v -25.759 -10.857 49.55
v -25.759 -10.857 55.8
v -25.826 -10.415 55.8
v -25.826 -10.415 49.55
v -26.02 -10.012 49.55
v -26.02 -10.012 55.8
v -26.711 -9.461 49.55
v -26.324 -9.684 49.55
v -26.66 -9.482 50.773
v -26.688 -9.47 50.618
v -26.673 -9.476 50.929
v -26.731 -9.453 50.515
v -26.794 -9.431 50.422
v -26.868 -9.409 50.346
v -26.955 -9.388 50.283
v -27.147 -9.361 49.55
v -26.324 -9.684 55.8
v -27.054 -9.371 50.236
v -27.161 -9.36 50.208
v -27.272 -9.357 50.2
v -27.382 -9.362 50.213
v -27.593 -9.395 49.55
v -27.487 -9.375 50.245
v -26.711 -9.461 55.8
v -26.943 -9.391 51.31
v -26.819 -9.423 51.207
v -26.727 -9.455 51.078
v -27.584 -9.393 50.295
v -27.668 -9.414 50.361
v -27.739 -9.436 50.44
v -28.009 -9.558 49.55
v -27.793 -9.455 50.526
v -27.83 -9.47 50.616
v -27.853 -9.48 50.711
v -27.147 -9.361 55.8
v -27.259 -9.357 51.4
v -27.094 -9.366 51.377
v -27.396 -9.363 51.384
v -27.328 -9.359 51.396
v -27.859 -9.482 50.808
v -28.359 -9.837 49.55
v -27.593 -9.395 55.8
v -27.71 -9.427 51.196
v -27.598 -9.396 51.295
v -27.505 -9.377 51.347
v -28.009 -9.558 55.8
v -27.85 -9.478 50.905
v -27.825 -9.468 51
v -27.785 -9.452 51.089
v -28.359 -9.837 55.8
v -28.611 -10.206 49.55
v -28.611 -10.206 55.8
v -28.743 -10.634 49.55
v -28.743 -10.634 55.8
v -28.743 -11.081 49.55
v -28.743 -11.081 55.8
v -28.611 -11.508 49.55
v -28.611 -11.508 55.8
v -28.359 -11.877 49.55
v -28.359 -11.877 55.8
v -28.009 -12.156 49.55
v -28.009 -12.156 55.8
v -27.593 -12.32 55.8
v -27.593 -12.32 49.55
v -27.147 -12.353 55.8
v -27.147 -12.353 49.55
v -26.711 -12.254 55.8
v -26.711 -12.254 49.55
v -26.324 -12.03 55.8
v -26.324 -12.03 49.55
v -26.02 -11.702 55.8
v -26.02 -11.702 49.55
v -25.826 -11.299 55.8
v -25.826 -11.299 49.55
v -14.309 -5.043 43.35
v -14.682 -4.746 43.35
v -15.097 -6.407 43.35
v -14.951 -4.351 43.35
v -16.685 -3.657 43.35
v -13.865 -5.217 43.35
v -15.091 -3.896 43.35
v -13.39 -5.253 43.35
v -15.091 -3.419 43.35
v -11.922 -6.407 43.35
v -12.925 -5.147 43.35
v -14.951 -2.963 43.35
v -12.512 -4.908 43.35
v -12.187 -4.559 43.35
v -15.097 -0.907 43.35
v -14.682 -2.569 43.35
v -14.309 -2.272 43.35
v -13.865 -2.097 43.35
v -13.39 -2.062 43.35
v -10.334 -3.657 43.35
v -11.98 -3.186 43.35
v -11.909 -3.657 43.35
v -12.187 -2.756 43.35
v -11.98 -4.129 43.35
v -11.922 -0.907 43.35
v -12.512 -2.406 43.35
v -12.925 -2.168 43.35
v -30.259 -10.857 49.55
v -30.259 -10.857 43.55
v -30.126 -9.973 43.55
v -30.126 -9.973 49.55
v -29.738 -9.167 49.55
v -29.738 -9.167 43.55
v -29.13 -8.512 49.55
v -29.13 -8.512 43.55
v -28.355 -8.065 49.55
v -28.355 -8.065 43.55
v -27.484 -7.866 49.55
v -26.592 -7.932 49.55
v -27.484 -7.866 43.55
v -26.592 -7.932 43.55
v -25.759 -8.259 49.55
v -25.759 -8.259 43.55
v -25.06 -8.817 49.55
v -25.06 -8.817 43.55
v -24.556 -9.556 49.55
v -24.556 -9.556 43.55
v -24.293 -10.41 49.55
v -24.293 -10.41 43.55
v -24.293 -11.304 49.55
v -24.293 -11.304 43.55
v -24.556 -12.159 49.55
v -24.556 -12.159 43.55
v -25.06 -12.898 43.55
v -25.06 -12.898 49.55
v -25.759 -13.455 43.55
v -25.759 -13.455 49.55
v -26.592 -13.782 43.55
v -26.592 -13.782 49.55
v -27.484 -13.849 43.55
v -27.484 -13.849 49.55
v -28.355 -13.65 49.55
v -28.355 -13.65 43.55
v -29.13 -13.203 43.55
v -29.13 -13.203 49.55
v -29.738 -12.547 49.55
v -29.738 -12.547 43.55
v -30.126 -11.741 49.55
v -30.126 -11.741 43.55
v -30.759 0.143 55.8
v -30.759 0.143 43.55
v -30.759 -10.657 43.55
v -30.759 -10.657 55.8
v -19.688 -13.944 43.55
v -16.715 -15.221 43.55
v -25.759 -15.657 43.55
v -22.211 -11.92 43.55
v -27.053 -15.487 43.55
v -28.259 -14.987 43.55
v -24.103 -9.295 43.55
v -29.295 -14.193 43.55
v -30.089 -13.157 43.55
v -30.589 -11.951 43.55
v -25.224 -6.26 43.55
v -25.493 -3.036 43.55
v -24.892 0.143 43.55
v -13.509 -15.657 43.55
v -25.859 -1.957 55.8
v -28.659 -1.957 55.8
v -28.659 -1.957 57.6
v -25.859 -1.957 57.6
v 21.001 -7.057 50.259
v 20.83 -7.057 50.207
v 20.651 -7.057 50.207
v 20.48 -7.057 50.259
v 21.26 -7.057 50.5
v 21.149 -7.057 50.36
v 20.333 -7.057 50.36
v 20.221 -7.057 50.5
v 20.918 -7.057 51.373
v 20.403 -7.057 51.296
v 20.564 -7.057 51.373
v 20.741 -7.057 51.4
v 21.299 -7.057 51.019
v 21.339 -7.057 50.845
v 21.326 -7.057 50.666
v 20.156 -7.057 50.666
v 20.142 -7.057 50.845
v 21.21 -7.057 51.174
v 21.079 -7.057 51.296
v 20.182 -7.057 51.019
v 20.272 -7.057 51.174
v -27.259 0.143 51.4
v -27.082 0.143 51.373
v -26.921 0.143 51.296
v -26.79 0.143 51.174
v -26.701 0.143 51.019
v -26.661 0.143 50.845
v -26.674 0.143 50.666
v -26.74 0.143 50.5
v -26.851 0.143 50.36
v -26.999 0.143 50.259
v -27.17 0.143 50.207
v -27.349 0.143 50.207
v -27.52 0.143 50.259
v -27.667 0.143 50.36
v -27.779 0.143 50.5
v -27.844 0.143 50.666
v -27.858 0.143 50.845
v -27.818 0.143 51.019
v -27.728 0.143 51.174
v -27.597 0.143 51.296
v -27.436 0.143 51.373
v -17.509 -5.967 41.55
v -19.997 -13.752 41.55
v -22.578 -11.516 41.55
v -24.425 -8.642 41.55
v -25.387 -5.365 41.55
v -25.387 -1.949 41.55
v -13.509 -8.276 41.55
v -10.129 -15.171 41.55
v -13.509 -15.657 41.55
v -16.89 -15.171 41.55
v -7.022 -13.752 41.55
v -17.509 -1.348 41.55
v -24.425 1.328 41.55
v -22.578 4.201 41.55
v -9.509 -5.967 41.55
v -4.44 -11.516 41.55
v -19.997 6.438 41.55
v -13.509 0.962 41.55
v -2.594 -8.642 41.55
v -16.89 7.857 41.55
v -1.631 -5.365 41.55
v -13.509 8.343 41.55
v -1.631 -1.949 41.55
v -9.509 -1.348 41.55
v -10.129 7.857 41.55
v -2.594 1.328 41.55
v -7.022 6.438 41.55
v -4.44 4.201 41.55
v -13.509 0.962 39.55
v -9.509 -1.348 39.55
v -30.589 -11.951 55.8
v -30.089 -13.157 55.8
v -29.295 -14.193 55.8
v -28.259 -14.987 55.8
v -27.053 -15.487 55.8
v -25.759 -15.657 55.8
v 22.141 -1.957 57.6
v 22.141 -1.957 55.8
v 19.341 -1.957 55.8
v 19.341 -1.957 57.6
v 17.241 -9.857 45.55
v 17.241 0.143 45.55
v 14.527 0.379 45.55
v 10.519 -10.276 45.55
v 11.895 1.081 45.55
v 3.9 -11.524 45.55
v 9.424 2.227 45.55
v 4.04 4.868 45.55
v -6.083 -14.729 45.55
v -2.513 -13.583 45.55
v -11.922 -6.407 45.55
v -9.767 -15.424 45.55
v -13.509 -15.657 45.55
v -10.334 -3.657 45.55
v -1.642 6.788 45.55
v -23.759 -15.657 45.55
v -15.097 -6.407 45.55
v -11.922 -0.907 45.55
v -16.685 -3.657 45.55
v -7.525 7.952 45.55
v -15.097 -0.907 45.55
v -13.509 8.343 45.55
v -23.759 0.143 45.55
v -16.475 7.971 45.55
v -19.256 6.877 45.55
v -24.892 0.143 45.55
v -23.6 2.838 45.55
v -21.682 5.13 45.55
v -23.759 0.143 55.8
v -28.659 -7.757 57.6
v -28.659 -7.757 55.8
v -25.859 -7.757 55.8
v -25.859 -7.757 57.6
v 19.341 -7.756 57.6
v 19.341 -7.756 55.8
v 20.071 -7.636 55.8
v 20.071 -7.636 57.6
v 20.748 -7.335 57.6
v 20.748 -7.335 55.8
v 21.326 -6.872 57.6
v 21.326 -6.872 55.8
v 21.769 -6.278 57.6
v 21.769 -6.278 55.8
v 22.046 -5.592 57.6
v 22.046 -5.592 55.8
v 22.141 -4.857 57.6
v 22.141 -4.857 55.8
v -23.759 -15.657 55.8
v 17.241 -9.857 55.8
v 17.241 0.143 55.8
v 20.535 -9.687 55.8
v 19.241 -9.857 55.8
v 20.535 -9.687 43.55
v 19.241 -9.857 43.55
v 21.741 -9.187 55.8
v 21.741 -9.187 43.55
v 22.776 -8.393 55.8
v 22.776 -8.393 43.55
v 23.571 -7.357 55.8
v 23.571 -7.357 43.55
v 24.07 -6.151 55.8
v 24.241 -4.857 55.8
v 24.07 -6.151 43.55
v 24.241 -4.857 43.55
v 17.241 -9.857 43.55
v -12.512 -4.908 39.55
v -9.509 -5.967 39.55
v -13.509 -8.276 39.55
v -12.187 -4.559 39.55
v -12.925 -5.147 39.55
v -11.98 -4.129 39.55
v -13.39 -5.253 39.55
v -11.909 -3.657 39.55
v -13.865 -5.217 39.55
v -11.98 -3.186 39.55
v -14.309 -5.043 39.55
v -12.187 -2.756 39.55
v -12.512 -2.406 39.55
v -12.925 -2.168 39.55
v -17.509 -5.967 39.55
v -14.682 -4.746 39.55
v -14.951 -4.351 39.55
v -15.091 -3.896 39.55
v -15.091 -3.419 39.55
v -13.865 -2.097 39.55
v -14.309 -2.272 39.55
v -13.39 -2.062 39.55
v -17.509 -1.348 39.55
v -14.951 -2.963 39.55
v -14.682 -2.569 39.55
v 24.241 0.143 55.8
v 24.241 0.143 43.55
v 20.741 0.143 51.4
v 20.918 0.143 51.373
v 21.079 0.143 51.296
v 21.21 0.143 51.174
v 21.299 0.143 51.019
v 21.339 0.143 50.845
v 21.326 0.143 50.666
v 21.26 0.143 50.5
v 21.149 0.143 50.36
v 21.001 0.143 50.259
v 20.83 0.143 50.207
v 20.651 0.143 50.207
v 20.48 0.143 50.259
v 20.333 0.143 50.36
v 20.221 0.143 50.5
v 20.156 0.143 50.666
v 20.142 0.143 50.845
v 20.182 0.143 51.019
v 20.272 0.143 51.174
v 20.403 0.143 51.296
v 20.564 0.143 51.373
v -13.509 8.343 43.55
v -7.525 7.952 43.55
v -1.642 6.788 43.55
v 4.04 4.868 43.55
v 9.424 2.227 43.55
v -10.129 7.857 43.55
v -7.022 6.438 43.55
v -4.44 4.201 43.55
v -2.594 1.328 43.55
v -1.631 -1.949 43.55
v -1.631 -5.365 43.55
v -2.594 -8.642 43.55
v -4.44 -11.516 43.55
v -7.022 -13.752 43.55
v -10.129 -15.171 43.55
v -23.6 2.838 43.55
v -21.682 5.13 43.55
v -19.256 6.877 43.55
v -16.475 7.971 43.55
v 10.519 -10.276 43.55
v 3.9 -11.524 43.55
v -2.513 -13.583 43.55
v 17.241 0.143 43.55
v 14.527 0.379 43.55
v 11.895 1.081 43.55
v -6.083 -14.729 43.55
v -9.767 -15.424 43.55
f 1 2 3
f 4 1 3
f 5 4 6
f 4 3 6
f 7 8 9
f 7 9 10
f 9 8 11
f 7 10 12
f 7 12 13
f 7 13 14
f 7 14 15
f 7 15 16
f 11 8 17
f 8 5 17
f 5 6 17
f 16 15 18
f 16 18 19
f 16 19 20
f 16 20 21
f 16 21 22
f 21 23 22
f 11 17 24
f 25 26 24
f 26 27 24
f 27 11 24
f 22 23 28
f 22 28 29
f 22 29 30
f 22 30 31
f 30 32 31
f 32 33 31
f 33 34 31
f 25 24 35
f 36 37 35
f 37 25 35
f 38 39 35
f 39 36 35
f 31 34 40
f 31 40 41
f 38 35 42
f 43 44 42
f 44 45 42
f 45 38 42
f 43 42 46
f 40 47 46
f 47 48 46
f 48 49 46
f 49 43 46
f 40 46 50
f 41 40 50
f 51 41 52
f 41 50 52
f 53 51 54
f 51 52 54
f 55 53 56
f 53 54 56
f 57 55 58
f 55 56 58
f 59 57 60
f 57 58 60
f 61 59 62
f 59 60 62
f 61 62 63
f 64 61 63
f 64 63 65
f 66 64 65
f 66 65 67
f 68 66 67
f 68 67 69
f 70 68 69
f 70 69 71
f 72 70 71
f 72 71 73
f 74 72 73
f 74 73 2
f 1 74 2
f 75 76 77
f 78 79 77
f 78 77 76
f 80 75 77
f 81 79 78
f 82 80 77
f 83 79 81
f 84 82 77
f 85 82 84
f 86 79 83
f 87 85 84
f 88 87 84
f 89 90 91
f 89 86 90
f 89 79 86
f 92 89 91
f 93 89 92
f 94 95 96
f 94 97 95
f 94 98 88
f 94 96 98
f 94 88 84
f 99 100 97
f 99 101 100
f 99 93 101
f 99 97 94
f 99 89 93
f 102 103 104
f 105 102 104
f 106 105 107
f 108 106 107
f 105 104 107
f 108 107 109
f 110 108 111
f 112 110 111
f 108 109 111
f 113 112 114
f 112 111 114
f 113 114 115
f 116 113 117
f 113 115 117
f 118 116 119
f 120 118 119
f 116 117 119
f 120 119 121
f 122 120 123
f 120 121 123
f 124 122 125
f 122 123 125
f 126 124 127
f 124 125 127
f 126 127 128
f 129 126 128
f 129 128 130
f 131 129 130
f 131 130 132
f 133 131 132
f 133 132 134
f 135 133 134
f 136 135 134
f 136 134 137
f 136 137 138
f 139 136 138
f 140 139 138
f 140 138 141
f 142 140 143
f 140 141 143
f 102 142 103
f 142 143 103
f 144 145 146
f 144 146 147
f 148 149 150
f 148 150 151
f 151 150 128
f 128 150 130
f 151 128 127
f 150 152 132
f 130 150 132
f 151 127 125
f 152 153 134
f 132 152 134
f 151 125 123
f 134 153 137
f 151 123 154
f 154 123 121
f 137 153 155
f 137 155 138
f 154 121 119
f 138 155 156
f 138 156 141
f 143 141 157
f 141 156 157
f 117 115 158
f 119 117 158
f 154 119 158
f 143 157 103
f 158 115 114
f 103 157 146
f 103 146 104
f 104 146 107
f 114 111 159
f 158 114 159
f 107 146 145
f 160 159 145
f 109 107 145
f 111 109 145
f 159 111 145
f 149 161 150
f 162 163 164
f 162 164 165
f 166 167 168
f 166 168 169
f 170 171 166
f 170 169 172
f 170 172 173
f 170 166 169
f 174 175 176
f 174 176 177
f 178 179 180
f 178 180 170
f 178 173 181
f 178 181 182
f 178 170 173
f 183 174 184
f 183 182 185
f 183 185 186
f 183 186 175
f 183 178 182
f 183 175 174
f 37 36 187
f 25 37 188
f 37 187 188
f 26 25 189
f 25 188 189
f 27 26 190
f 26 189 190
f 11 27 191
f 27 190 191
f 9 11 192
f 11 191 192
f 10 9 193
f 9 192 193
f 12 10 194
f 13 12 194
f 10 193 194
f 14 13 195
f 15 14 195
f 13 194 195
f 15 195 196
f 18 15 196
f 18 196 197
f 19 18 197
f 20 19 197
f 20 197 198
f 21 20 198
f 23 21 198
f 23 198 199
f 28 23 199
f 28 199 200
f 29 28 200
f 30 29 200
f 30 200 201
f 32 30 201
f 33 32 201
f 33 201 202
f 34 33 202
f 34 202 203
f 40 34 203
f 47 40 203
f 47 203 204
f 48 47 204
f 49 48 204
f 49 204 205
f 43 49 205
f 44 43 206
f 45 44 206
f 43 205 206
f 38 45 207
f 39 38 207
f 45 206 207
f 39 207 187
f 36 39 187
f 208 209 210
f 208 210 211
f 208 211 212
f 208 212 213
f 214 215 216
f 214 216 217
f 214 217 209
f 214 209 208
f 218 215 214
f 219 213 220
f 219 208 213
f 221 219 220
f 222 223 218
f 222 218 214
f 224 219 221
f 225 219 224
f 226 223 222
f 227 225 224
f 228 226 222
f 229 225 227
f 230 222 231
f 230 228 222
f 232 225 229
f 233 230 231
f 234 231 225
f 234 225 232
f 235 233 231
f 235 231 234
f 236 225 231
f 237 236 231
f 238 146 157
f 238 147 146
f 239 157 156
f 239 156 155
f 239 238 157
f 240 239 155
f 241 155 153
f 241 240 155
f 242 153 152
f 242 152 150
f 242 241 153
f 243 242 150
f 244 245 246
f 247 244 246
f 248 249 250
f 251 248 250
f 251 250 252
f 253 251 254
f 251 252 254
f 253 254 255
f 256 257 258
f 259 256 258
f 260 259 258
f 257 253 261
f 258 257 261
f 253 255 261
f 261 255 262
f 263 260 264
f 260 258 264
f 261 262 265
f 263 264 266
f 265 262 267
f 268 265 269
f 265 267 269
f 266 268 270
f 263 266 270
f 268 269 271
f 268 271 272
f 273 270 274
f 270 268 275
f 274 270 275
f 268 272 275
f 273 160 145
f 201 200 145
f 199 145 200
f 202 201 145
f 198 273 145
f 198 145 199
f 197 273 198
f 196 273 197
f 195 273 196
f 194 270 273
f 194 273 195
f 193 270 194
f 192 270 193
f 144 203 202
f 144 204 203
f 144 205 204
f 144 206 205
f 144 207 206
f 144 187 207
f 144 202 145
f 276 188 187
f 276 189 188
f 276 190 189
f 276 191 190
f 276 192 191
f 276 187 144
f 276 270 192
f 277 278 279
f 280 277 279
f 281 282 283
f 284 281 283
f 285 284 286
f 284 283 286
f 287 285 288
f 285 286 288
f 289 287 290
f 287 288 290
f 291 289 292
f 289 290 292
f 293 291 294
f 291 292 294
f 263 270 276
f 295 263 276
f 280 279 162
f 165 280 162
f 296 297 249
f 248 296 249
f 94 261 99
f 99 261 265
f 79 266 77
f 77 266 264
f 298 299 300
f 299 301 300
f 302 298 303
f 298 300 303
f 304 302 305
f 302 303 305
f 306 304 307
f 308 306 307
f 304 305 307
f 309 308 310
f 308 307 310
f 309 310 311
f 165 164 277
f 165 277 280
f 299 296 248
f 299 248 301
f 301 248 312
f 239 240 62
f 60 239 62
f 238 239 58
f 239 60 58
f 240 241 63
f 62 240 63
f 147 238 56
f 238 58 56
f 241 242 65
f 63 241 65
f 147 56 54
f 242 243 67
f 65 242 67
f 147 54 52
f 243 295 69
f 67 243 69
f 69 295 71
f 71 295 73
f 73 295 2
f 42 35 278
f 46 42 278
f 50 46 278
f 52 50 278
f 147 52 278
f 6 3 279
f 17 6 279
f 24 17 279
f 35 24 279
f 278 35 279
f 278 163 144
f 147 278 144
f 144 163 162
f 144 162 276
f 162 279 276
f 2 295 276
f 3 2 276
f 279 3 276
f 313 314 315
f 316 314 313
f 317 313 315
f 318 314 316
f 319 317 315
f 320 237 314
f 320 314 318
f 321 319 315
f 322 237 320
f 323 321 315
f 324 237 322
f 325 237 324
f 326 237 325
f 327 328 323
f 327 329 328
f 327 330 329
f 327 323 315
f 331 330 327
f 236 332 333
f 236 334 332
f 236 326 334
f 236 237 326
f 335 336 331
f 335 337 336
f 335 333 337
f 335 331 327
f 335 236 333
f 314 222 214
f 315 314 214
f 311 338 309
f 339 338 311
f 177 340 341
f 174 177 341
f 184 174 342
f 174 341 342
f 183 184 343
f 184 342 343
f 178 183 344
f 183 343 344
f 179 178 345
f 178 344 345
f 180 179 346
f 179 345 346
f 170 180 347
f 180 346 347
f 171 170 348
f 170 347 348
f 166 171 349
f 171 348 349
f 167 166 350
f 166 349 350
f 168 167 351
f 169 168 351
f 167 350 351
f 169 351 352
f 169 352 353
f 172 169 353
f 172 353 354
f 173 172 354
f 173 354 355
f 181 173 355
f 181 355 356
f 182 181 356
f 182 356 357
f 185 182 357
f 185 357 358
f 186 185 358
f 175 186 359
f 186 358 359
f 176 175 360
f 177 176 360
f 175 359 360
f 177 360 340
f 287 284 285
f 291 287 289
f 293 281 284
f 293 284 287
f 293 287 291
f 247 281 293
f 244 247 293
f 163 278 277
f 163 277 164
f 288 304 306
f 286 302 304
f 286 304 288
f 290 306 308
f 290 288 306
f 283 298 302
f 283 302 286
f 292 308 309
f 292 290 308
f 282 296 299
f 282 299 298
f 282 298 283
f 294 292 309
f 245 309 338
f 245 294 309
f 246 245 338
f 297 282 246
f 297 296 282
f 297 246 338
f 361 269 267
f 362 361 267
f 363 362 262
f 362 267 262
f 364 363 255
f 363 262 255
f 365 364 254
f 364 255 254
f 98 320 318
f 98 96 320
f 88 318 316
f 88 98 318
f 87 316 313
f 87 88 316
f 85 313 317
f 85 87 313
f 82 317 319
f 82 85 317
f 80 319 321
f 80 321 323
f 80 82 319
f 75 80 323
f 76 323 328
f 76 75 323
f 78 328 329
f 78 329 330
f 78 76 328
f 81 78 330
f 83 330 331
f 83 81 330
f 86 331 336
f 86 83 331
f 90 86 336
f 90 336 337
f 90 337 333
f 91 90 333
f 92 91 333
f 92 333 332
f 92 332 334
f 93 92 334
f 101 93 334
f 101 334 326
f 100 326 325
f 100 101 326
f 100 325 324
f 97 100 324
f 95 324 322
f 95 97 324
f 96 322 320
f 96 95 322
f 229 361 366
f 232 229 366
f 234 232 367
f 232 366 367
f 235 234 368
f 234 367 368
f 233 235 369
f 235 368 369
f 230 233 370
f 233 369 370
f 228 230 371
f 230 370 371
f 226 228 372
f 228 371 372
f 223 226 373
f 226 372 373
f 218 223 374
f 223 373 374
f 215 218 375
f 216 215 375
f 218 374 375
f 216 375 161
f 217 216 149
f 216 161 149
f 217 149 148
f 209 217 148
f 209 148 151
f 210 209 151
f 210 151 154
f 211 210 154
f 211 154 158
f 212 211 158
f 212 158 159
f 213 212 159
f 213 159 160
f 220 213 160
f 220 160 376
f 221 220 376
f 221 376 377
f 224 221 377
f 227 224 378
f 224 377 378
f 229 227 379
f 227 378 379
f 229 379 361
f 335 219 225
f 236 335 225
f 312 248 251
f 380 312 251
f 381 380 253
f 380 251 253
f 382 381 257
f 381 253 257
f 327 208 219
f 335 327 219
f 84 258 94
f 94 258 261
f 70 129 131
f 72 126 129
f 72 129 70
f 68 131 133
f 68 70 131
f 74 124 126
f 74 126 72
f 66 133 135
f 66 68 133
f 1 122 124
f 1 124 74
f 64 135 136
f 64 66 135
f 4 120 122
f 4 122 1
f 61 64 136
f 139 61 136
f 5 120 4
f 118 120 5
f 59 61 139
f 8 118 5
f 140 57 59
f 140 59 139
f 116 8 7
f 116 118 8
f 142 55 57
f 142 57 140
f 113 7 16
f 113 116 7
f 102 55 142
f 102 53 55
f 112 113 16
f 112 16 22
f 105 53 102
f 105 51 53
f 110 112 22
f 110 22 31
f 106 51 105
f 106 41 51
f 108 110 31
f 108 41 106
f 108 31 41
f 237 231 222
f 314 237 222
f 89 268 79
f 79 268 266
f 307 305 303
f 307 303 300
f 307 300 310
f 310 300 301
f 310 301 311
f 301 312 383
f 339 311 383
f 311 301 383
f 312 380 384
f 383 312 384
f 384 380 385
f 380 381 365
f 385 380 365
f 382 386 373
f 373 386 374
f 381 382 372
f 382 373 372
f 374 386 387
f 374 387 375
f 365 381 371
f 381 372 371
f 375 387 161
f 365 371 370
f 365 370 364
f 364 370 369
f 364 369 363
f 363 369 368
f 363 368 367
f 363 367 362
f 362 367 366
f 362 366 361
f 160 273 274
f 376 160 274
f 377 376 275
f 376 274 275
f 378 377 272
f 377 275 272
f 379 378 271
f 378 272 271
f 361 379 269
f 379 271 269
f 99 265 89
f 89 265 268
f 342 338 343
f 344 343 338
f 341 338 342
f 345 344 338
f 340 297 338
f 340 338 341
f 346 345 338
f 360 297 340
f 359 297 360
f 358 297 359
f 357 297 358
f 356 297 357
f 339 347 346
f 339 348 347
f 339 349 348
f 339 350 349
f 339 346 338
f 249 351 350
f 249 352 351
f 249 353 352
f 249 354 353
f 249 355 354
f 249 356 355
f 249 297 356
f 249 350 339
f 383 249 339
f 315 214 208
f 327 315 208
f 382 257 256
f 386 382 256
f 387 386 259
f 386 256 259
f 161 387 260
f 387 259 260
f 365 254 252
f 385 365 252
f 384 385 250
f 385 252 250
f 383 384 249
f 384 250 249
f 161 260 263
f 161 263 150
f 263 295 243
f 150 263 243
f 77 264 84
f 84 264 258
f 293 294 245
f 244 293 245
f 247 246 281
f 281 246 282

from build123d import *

# Parameters (mm, degrees)
SALIENTE_EXTRUIR1_DEPTH = 2
CROQUIS2_W              = 12.25
CROQUIS2_H              = 10
SALIENTE_EXTRUIR2_DEPTH = 7
REDONDEO1_R             = 5
CROQUIS3_R              = 0.6
CORTAR_EXTRUIR1_DEPTH   = 7.2
SALIENTE_EXTRUIR3_DEPTH = 1.8
CROQUIS5_W              = 12.25
CROQUIS5_H              = 15.8
SALIENTE_EXTRUIR4_DEPTH = 7
REDONDEO2_R             = 5
CROQUIS6_R              = 0.6
CORTAR_EXTRUIR2_DEPTH   = 9.8
CROQUIS7_W              = 2.8
CROQUIS7_H              = 5.8
SALIENTE_EXTRUIR5_DEPTH = 1.8
CROQUIS8_R              = 1.5
CORTAR_EXTRUIR3_DEPTH   = 13.8
CROQUIS9_R              = 3
CORTAR_EXTRUIR4_DEPTH   = 6
CROQUIS10_R             = 12
SALIENTE_EXTRUIR6_DEPTH = 2
CORTAR_EXTRUIR5_DEPTH   = 2.2
CROQUIS12_R             = 1.6
CORTAR_EXTRUIR6_DEPTH   = 4.2
CROQUIS14_R             = 1.6
SALIENTE_EXTRUIR7_DEPTH = 2


with BuildPart() as part:
    # Croquis1 → Saliente-Extruir1 (new body)
    with BuildSketch(Plane(origin=(0, 0, 45.55), x_dir=(-1, 0, 0), z_dir=(0, 0, -1))):
        with BuildLine():
            Line((-17.240678969, 0.142768675), (-17.240678969, -9.857231325))
            ThreePointArc((-17.240678969, -9.857231325), (-7.189890991, -10.796826624), (2.512589694, -13.583051105))
            ThreePointArc((2.512589694, -13.583051105), (7.914003263, -15.134154499), (13.509321031, -15.657231325))
            Line((13.509321031, -15.657231325), (25.509321031, -15.657231325))
            Line((25.509321031, -15.657231325), (25.509321031, -3.657231325))
            ThreePointArc((25.509321031, -3.657231325), (21.994602405, 4.82805005), (13.509321031, 8.342768675))
            ThreePointArc((13.509321031, 8.342768675), (1.641917085, 6.787620461), (-9.424079639, 2.227195163))
            ThreePointArc((-9.424079639, 2.227195163), (-13.195803851, 0.672823972), (-17.240678969, 0.142768675))
        make_face()
    extrude(amount=SALIENTE_EXTRUIR1_DEPTH)

    # Croquis2 → Saliente-Extruir2 (add)
    with BuildSketch(Plane(origin=(17.240678969, 0, 0), x_dir=(0, 0, -1), z_dir=(1, 0, 0))):
        with Locations((-49.675, -4.857231325)):
            Rectangle(CROQUIS2_W, CROQUIS2_H)
    extrude(amount=SALIENTE_EXTRUIR2_DEPTH)

    # Redondeo1
    redondeo1_edges = [part.edges().sort_by_distance(p)[0] for p in [
        (24.240678969, -9.857231325, 49.675),
    ]]
    fillet(redondeo1_edges, radius=REDONDEO1_R)

    # Croquis3 → Cortar-Extruir1 (cut)
    with BuildSketch(Plane(origin=(0, 0.142768675, 0), x_dir=(1, 0, 0), z_dir=(0, 1, 0))):
        with Locations(Location((20.740678969, -50.8, 0), (0, 0, 270))):
            Circle(CROQUIS3_R)
    extrude(amount=-CORTAR_EXTRUIR1_DEPTH, mode=Mode.SUBTRACT)

    # Croquis4 → Saliente-Extruir3 (add)
    with BuildSketch(Plane.XY.offset(55.8)):
        with BuildLine():
            Line((19.340678969, -1.957231325), (19.340678969, -7.755506674))
            ThreePointArc((19.340678969, -7.755506674), (21.32634433, -6.872175493), (22.140678969, -4.857231325))
            Line((22.140678969, -4.857231325), (22.140678969, -1.957231325))
            Line((22.140678969, -1.957231325), (19.340678969, -1.957231325))
        make_face()
    extrude(amount=SALIENTE_EXTRUIR3_DEPTH)

    # Croquis5 → Saliente-Extruir4 (add)
    with BuildSketch(Plane.ZY.offset(23.759321031)):
        with Locations((49.675, -7.757231325)):
            Rectangle(CROQUIS5_W, CROQUIS5_H)
    extrude(amount=SALIENTE_EXTRUIR4_DEPTH)

    # Redondeo2
    redondeo2_edges = [part.edges().sort_by_distance(p)[0] for p in [
        (-30.759321031, -15.657231325, 49.675),
    ]]
    fillet(redondeo2_edges, radius=REDONDEO2_R)

    # Croquis6 → Cortar-Extruir2 (cut)
    with BuildSketch(Plane(origin=(0, 0.142768675, 0), x_dir=(1, 0, 0), z_dir=(0, 1, 0))):
        with Locations(Location((-27.259321031, -50.8, 0), (0, 0, 270))):
            Circle(CROQUIS6_R)
    extrude(amount=-CORTAR_EXTRUIR2_DEPTH, mode=Mode.SUBTRACT)

    # Croquis7 → Saliente-Extruir5 (add)
    with BuildSketch(Plane.XY.offset(55.8)):
        with Locations((-27.259321031, -4.857231325)):
            Rectangle(CROQUIS7_W, CROQUIS7_H)
    extrude(amount=SALIENTE_EXTRUIR5_DEPTH)

    # Croquis8 → Cortar-Extruir3 (cut)
    with BuildSketch(Plane.XY.offset(55.8)):
        with Locations((-27.259321031, -10.857231325)):
            Circle(CROQUIS8_R)
    extrude(amount=-CORTAR_EXTRUIR3_DEPTH, mode=Mode.SUBTRACT)

    # Croquis9 → Cortar-Extruir4 (cut)
    with BuildSketch(Plane(origin=(0, 0, 43.55), x_dir=(-1, 0, 0), z_dir=(0, 0, -1))):
        with Locations((27.259321031, -10.857231325)):
            Circle(CROQUIS9_R)
    extrude(amount=-CORTAR_EXTRUIR4_DEPTH, mode=Mode.SUBTRACT)

    # Croquis10 → Saliente-Extruir6 (add)
    with BuildSketch(Plane(origin=(0, 0, 43.55), x_dir=(-1, 0, 0), z_dir=(0, 0, -1))):
        with Locations(Location((13.509321031, -3.657231325, 0), (0, 0, 90))):
            Circle(CROQUIS10_R)
    extrude(amount=SALIENTE_EXTRUIR6_DEPTH)

    # Croquis11 → Cortar-Extruir5 (cut)
    with BuildSketch(Plane.XY.offset(45.55)):
        Polygon((-15.097034272, -0.907231325), (-16.684747512, -3.657231325), (-15.097034272, -6.407231325), (-11.921607791, -6.407231325), (-10.333894551, -3.657231325), (-11.921607791, -0.907231325), align=None)
    extrude(amount=-CORTAR_EXTRUIR5_DEPTH, mode=Mode.SUBTRACT)

    # Croquis12 → Cortar-Extruir6 (cut)
    with BuildSketch(Plane.XY.offset(45.55)):
        with Locations((-13.509321031, -3.657231325)):
            Circle(CROQUIS12_R)
    extrude(amount=-CORTAR_EXTRUIR6_DEPTH, mode=Mode.SUBTRACT)

    # Croquis14 → Saliente-Extruir7 (add)
    with BuildSketch(Plane(origin=(0, 0, 41.55), x_dir=(-1, 0, 0), z_dir=(0, 0, -1))):
        Polygon((13.509321031, 0.961570829), (9.509321031, -1.347830248), (9.509321031, -5.966632401), (13.509321031, -8.276033478), (17.509321031, -5.966632401), (17.509321031, -1.347830248), align=None)
        with Locations(Location((13.509321031, -3.657231325, 0), (0, 0, 180))):
            Circle(CROQUIS14_R, mode=Mode.SUBTRACT)
    extrude(amount=SALIENTE_EXTRUIR7_DEPTH)


solid = part.part
